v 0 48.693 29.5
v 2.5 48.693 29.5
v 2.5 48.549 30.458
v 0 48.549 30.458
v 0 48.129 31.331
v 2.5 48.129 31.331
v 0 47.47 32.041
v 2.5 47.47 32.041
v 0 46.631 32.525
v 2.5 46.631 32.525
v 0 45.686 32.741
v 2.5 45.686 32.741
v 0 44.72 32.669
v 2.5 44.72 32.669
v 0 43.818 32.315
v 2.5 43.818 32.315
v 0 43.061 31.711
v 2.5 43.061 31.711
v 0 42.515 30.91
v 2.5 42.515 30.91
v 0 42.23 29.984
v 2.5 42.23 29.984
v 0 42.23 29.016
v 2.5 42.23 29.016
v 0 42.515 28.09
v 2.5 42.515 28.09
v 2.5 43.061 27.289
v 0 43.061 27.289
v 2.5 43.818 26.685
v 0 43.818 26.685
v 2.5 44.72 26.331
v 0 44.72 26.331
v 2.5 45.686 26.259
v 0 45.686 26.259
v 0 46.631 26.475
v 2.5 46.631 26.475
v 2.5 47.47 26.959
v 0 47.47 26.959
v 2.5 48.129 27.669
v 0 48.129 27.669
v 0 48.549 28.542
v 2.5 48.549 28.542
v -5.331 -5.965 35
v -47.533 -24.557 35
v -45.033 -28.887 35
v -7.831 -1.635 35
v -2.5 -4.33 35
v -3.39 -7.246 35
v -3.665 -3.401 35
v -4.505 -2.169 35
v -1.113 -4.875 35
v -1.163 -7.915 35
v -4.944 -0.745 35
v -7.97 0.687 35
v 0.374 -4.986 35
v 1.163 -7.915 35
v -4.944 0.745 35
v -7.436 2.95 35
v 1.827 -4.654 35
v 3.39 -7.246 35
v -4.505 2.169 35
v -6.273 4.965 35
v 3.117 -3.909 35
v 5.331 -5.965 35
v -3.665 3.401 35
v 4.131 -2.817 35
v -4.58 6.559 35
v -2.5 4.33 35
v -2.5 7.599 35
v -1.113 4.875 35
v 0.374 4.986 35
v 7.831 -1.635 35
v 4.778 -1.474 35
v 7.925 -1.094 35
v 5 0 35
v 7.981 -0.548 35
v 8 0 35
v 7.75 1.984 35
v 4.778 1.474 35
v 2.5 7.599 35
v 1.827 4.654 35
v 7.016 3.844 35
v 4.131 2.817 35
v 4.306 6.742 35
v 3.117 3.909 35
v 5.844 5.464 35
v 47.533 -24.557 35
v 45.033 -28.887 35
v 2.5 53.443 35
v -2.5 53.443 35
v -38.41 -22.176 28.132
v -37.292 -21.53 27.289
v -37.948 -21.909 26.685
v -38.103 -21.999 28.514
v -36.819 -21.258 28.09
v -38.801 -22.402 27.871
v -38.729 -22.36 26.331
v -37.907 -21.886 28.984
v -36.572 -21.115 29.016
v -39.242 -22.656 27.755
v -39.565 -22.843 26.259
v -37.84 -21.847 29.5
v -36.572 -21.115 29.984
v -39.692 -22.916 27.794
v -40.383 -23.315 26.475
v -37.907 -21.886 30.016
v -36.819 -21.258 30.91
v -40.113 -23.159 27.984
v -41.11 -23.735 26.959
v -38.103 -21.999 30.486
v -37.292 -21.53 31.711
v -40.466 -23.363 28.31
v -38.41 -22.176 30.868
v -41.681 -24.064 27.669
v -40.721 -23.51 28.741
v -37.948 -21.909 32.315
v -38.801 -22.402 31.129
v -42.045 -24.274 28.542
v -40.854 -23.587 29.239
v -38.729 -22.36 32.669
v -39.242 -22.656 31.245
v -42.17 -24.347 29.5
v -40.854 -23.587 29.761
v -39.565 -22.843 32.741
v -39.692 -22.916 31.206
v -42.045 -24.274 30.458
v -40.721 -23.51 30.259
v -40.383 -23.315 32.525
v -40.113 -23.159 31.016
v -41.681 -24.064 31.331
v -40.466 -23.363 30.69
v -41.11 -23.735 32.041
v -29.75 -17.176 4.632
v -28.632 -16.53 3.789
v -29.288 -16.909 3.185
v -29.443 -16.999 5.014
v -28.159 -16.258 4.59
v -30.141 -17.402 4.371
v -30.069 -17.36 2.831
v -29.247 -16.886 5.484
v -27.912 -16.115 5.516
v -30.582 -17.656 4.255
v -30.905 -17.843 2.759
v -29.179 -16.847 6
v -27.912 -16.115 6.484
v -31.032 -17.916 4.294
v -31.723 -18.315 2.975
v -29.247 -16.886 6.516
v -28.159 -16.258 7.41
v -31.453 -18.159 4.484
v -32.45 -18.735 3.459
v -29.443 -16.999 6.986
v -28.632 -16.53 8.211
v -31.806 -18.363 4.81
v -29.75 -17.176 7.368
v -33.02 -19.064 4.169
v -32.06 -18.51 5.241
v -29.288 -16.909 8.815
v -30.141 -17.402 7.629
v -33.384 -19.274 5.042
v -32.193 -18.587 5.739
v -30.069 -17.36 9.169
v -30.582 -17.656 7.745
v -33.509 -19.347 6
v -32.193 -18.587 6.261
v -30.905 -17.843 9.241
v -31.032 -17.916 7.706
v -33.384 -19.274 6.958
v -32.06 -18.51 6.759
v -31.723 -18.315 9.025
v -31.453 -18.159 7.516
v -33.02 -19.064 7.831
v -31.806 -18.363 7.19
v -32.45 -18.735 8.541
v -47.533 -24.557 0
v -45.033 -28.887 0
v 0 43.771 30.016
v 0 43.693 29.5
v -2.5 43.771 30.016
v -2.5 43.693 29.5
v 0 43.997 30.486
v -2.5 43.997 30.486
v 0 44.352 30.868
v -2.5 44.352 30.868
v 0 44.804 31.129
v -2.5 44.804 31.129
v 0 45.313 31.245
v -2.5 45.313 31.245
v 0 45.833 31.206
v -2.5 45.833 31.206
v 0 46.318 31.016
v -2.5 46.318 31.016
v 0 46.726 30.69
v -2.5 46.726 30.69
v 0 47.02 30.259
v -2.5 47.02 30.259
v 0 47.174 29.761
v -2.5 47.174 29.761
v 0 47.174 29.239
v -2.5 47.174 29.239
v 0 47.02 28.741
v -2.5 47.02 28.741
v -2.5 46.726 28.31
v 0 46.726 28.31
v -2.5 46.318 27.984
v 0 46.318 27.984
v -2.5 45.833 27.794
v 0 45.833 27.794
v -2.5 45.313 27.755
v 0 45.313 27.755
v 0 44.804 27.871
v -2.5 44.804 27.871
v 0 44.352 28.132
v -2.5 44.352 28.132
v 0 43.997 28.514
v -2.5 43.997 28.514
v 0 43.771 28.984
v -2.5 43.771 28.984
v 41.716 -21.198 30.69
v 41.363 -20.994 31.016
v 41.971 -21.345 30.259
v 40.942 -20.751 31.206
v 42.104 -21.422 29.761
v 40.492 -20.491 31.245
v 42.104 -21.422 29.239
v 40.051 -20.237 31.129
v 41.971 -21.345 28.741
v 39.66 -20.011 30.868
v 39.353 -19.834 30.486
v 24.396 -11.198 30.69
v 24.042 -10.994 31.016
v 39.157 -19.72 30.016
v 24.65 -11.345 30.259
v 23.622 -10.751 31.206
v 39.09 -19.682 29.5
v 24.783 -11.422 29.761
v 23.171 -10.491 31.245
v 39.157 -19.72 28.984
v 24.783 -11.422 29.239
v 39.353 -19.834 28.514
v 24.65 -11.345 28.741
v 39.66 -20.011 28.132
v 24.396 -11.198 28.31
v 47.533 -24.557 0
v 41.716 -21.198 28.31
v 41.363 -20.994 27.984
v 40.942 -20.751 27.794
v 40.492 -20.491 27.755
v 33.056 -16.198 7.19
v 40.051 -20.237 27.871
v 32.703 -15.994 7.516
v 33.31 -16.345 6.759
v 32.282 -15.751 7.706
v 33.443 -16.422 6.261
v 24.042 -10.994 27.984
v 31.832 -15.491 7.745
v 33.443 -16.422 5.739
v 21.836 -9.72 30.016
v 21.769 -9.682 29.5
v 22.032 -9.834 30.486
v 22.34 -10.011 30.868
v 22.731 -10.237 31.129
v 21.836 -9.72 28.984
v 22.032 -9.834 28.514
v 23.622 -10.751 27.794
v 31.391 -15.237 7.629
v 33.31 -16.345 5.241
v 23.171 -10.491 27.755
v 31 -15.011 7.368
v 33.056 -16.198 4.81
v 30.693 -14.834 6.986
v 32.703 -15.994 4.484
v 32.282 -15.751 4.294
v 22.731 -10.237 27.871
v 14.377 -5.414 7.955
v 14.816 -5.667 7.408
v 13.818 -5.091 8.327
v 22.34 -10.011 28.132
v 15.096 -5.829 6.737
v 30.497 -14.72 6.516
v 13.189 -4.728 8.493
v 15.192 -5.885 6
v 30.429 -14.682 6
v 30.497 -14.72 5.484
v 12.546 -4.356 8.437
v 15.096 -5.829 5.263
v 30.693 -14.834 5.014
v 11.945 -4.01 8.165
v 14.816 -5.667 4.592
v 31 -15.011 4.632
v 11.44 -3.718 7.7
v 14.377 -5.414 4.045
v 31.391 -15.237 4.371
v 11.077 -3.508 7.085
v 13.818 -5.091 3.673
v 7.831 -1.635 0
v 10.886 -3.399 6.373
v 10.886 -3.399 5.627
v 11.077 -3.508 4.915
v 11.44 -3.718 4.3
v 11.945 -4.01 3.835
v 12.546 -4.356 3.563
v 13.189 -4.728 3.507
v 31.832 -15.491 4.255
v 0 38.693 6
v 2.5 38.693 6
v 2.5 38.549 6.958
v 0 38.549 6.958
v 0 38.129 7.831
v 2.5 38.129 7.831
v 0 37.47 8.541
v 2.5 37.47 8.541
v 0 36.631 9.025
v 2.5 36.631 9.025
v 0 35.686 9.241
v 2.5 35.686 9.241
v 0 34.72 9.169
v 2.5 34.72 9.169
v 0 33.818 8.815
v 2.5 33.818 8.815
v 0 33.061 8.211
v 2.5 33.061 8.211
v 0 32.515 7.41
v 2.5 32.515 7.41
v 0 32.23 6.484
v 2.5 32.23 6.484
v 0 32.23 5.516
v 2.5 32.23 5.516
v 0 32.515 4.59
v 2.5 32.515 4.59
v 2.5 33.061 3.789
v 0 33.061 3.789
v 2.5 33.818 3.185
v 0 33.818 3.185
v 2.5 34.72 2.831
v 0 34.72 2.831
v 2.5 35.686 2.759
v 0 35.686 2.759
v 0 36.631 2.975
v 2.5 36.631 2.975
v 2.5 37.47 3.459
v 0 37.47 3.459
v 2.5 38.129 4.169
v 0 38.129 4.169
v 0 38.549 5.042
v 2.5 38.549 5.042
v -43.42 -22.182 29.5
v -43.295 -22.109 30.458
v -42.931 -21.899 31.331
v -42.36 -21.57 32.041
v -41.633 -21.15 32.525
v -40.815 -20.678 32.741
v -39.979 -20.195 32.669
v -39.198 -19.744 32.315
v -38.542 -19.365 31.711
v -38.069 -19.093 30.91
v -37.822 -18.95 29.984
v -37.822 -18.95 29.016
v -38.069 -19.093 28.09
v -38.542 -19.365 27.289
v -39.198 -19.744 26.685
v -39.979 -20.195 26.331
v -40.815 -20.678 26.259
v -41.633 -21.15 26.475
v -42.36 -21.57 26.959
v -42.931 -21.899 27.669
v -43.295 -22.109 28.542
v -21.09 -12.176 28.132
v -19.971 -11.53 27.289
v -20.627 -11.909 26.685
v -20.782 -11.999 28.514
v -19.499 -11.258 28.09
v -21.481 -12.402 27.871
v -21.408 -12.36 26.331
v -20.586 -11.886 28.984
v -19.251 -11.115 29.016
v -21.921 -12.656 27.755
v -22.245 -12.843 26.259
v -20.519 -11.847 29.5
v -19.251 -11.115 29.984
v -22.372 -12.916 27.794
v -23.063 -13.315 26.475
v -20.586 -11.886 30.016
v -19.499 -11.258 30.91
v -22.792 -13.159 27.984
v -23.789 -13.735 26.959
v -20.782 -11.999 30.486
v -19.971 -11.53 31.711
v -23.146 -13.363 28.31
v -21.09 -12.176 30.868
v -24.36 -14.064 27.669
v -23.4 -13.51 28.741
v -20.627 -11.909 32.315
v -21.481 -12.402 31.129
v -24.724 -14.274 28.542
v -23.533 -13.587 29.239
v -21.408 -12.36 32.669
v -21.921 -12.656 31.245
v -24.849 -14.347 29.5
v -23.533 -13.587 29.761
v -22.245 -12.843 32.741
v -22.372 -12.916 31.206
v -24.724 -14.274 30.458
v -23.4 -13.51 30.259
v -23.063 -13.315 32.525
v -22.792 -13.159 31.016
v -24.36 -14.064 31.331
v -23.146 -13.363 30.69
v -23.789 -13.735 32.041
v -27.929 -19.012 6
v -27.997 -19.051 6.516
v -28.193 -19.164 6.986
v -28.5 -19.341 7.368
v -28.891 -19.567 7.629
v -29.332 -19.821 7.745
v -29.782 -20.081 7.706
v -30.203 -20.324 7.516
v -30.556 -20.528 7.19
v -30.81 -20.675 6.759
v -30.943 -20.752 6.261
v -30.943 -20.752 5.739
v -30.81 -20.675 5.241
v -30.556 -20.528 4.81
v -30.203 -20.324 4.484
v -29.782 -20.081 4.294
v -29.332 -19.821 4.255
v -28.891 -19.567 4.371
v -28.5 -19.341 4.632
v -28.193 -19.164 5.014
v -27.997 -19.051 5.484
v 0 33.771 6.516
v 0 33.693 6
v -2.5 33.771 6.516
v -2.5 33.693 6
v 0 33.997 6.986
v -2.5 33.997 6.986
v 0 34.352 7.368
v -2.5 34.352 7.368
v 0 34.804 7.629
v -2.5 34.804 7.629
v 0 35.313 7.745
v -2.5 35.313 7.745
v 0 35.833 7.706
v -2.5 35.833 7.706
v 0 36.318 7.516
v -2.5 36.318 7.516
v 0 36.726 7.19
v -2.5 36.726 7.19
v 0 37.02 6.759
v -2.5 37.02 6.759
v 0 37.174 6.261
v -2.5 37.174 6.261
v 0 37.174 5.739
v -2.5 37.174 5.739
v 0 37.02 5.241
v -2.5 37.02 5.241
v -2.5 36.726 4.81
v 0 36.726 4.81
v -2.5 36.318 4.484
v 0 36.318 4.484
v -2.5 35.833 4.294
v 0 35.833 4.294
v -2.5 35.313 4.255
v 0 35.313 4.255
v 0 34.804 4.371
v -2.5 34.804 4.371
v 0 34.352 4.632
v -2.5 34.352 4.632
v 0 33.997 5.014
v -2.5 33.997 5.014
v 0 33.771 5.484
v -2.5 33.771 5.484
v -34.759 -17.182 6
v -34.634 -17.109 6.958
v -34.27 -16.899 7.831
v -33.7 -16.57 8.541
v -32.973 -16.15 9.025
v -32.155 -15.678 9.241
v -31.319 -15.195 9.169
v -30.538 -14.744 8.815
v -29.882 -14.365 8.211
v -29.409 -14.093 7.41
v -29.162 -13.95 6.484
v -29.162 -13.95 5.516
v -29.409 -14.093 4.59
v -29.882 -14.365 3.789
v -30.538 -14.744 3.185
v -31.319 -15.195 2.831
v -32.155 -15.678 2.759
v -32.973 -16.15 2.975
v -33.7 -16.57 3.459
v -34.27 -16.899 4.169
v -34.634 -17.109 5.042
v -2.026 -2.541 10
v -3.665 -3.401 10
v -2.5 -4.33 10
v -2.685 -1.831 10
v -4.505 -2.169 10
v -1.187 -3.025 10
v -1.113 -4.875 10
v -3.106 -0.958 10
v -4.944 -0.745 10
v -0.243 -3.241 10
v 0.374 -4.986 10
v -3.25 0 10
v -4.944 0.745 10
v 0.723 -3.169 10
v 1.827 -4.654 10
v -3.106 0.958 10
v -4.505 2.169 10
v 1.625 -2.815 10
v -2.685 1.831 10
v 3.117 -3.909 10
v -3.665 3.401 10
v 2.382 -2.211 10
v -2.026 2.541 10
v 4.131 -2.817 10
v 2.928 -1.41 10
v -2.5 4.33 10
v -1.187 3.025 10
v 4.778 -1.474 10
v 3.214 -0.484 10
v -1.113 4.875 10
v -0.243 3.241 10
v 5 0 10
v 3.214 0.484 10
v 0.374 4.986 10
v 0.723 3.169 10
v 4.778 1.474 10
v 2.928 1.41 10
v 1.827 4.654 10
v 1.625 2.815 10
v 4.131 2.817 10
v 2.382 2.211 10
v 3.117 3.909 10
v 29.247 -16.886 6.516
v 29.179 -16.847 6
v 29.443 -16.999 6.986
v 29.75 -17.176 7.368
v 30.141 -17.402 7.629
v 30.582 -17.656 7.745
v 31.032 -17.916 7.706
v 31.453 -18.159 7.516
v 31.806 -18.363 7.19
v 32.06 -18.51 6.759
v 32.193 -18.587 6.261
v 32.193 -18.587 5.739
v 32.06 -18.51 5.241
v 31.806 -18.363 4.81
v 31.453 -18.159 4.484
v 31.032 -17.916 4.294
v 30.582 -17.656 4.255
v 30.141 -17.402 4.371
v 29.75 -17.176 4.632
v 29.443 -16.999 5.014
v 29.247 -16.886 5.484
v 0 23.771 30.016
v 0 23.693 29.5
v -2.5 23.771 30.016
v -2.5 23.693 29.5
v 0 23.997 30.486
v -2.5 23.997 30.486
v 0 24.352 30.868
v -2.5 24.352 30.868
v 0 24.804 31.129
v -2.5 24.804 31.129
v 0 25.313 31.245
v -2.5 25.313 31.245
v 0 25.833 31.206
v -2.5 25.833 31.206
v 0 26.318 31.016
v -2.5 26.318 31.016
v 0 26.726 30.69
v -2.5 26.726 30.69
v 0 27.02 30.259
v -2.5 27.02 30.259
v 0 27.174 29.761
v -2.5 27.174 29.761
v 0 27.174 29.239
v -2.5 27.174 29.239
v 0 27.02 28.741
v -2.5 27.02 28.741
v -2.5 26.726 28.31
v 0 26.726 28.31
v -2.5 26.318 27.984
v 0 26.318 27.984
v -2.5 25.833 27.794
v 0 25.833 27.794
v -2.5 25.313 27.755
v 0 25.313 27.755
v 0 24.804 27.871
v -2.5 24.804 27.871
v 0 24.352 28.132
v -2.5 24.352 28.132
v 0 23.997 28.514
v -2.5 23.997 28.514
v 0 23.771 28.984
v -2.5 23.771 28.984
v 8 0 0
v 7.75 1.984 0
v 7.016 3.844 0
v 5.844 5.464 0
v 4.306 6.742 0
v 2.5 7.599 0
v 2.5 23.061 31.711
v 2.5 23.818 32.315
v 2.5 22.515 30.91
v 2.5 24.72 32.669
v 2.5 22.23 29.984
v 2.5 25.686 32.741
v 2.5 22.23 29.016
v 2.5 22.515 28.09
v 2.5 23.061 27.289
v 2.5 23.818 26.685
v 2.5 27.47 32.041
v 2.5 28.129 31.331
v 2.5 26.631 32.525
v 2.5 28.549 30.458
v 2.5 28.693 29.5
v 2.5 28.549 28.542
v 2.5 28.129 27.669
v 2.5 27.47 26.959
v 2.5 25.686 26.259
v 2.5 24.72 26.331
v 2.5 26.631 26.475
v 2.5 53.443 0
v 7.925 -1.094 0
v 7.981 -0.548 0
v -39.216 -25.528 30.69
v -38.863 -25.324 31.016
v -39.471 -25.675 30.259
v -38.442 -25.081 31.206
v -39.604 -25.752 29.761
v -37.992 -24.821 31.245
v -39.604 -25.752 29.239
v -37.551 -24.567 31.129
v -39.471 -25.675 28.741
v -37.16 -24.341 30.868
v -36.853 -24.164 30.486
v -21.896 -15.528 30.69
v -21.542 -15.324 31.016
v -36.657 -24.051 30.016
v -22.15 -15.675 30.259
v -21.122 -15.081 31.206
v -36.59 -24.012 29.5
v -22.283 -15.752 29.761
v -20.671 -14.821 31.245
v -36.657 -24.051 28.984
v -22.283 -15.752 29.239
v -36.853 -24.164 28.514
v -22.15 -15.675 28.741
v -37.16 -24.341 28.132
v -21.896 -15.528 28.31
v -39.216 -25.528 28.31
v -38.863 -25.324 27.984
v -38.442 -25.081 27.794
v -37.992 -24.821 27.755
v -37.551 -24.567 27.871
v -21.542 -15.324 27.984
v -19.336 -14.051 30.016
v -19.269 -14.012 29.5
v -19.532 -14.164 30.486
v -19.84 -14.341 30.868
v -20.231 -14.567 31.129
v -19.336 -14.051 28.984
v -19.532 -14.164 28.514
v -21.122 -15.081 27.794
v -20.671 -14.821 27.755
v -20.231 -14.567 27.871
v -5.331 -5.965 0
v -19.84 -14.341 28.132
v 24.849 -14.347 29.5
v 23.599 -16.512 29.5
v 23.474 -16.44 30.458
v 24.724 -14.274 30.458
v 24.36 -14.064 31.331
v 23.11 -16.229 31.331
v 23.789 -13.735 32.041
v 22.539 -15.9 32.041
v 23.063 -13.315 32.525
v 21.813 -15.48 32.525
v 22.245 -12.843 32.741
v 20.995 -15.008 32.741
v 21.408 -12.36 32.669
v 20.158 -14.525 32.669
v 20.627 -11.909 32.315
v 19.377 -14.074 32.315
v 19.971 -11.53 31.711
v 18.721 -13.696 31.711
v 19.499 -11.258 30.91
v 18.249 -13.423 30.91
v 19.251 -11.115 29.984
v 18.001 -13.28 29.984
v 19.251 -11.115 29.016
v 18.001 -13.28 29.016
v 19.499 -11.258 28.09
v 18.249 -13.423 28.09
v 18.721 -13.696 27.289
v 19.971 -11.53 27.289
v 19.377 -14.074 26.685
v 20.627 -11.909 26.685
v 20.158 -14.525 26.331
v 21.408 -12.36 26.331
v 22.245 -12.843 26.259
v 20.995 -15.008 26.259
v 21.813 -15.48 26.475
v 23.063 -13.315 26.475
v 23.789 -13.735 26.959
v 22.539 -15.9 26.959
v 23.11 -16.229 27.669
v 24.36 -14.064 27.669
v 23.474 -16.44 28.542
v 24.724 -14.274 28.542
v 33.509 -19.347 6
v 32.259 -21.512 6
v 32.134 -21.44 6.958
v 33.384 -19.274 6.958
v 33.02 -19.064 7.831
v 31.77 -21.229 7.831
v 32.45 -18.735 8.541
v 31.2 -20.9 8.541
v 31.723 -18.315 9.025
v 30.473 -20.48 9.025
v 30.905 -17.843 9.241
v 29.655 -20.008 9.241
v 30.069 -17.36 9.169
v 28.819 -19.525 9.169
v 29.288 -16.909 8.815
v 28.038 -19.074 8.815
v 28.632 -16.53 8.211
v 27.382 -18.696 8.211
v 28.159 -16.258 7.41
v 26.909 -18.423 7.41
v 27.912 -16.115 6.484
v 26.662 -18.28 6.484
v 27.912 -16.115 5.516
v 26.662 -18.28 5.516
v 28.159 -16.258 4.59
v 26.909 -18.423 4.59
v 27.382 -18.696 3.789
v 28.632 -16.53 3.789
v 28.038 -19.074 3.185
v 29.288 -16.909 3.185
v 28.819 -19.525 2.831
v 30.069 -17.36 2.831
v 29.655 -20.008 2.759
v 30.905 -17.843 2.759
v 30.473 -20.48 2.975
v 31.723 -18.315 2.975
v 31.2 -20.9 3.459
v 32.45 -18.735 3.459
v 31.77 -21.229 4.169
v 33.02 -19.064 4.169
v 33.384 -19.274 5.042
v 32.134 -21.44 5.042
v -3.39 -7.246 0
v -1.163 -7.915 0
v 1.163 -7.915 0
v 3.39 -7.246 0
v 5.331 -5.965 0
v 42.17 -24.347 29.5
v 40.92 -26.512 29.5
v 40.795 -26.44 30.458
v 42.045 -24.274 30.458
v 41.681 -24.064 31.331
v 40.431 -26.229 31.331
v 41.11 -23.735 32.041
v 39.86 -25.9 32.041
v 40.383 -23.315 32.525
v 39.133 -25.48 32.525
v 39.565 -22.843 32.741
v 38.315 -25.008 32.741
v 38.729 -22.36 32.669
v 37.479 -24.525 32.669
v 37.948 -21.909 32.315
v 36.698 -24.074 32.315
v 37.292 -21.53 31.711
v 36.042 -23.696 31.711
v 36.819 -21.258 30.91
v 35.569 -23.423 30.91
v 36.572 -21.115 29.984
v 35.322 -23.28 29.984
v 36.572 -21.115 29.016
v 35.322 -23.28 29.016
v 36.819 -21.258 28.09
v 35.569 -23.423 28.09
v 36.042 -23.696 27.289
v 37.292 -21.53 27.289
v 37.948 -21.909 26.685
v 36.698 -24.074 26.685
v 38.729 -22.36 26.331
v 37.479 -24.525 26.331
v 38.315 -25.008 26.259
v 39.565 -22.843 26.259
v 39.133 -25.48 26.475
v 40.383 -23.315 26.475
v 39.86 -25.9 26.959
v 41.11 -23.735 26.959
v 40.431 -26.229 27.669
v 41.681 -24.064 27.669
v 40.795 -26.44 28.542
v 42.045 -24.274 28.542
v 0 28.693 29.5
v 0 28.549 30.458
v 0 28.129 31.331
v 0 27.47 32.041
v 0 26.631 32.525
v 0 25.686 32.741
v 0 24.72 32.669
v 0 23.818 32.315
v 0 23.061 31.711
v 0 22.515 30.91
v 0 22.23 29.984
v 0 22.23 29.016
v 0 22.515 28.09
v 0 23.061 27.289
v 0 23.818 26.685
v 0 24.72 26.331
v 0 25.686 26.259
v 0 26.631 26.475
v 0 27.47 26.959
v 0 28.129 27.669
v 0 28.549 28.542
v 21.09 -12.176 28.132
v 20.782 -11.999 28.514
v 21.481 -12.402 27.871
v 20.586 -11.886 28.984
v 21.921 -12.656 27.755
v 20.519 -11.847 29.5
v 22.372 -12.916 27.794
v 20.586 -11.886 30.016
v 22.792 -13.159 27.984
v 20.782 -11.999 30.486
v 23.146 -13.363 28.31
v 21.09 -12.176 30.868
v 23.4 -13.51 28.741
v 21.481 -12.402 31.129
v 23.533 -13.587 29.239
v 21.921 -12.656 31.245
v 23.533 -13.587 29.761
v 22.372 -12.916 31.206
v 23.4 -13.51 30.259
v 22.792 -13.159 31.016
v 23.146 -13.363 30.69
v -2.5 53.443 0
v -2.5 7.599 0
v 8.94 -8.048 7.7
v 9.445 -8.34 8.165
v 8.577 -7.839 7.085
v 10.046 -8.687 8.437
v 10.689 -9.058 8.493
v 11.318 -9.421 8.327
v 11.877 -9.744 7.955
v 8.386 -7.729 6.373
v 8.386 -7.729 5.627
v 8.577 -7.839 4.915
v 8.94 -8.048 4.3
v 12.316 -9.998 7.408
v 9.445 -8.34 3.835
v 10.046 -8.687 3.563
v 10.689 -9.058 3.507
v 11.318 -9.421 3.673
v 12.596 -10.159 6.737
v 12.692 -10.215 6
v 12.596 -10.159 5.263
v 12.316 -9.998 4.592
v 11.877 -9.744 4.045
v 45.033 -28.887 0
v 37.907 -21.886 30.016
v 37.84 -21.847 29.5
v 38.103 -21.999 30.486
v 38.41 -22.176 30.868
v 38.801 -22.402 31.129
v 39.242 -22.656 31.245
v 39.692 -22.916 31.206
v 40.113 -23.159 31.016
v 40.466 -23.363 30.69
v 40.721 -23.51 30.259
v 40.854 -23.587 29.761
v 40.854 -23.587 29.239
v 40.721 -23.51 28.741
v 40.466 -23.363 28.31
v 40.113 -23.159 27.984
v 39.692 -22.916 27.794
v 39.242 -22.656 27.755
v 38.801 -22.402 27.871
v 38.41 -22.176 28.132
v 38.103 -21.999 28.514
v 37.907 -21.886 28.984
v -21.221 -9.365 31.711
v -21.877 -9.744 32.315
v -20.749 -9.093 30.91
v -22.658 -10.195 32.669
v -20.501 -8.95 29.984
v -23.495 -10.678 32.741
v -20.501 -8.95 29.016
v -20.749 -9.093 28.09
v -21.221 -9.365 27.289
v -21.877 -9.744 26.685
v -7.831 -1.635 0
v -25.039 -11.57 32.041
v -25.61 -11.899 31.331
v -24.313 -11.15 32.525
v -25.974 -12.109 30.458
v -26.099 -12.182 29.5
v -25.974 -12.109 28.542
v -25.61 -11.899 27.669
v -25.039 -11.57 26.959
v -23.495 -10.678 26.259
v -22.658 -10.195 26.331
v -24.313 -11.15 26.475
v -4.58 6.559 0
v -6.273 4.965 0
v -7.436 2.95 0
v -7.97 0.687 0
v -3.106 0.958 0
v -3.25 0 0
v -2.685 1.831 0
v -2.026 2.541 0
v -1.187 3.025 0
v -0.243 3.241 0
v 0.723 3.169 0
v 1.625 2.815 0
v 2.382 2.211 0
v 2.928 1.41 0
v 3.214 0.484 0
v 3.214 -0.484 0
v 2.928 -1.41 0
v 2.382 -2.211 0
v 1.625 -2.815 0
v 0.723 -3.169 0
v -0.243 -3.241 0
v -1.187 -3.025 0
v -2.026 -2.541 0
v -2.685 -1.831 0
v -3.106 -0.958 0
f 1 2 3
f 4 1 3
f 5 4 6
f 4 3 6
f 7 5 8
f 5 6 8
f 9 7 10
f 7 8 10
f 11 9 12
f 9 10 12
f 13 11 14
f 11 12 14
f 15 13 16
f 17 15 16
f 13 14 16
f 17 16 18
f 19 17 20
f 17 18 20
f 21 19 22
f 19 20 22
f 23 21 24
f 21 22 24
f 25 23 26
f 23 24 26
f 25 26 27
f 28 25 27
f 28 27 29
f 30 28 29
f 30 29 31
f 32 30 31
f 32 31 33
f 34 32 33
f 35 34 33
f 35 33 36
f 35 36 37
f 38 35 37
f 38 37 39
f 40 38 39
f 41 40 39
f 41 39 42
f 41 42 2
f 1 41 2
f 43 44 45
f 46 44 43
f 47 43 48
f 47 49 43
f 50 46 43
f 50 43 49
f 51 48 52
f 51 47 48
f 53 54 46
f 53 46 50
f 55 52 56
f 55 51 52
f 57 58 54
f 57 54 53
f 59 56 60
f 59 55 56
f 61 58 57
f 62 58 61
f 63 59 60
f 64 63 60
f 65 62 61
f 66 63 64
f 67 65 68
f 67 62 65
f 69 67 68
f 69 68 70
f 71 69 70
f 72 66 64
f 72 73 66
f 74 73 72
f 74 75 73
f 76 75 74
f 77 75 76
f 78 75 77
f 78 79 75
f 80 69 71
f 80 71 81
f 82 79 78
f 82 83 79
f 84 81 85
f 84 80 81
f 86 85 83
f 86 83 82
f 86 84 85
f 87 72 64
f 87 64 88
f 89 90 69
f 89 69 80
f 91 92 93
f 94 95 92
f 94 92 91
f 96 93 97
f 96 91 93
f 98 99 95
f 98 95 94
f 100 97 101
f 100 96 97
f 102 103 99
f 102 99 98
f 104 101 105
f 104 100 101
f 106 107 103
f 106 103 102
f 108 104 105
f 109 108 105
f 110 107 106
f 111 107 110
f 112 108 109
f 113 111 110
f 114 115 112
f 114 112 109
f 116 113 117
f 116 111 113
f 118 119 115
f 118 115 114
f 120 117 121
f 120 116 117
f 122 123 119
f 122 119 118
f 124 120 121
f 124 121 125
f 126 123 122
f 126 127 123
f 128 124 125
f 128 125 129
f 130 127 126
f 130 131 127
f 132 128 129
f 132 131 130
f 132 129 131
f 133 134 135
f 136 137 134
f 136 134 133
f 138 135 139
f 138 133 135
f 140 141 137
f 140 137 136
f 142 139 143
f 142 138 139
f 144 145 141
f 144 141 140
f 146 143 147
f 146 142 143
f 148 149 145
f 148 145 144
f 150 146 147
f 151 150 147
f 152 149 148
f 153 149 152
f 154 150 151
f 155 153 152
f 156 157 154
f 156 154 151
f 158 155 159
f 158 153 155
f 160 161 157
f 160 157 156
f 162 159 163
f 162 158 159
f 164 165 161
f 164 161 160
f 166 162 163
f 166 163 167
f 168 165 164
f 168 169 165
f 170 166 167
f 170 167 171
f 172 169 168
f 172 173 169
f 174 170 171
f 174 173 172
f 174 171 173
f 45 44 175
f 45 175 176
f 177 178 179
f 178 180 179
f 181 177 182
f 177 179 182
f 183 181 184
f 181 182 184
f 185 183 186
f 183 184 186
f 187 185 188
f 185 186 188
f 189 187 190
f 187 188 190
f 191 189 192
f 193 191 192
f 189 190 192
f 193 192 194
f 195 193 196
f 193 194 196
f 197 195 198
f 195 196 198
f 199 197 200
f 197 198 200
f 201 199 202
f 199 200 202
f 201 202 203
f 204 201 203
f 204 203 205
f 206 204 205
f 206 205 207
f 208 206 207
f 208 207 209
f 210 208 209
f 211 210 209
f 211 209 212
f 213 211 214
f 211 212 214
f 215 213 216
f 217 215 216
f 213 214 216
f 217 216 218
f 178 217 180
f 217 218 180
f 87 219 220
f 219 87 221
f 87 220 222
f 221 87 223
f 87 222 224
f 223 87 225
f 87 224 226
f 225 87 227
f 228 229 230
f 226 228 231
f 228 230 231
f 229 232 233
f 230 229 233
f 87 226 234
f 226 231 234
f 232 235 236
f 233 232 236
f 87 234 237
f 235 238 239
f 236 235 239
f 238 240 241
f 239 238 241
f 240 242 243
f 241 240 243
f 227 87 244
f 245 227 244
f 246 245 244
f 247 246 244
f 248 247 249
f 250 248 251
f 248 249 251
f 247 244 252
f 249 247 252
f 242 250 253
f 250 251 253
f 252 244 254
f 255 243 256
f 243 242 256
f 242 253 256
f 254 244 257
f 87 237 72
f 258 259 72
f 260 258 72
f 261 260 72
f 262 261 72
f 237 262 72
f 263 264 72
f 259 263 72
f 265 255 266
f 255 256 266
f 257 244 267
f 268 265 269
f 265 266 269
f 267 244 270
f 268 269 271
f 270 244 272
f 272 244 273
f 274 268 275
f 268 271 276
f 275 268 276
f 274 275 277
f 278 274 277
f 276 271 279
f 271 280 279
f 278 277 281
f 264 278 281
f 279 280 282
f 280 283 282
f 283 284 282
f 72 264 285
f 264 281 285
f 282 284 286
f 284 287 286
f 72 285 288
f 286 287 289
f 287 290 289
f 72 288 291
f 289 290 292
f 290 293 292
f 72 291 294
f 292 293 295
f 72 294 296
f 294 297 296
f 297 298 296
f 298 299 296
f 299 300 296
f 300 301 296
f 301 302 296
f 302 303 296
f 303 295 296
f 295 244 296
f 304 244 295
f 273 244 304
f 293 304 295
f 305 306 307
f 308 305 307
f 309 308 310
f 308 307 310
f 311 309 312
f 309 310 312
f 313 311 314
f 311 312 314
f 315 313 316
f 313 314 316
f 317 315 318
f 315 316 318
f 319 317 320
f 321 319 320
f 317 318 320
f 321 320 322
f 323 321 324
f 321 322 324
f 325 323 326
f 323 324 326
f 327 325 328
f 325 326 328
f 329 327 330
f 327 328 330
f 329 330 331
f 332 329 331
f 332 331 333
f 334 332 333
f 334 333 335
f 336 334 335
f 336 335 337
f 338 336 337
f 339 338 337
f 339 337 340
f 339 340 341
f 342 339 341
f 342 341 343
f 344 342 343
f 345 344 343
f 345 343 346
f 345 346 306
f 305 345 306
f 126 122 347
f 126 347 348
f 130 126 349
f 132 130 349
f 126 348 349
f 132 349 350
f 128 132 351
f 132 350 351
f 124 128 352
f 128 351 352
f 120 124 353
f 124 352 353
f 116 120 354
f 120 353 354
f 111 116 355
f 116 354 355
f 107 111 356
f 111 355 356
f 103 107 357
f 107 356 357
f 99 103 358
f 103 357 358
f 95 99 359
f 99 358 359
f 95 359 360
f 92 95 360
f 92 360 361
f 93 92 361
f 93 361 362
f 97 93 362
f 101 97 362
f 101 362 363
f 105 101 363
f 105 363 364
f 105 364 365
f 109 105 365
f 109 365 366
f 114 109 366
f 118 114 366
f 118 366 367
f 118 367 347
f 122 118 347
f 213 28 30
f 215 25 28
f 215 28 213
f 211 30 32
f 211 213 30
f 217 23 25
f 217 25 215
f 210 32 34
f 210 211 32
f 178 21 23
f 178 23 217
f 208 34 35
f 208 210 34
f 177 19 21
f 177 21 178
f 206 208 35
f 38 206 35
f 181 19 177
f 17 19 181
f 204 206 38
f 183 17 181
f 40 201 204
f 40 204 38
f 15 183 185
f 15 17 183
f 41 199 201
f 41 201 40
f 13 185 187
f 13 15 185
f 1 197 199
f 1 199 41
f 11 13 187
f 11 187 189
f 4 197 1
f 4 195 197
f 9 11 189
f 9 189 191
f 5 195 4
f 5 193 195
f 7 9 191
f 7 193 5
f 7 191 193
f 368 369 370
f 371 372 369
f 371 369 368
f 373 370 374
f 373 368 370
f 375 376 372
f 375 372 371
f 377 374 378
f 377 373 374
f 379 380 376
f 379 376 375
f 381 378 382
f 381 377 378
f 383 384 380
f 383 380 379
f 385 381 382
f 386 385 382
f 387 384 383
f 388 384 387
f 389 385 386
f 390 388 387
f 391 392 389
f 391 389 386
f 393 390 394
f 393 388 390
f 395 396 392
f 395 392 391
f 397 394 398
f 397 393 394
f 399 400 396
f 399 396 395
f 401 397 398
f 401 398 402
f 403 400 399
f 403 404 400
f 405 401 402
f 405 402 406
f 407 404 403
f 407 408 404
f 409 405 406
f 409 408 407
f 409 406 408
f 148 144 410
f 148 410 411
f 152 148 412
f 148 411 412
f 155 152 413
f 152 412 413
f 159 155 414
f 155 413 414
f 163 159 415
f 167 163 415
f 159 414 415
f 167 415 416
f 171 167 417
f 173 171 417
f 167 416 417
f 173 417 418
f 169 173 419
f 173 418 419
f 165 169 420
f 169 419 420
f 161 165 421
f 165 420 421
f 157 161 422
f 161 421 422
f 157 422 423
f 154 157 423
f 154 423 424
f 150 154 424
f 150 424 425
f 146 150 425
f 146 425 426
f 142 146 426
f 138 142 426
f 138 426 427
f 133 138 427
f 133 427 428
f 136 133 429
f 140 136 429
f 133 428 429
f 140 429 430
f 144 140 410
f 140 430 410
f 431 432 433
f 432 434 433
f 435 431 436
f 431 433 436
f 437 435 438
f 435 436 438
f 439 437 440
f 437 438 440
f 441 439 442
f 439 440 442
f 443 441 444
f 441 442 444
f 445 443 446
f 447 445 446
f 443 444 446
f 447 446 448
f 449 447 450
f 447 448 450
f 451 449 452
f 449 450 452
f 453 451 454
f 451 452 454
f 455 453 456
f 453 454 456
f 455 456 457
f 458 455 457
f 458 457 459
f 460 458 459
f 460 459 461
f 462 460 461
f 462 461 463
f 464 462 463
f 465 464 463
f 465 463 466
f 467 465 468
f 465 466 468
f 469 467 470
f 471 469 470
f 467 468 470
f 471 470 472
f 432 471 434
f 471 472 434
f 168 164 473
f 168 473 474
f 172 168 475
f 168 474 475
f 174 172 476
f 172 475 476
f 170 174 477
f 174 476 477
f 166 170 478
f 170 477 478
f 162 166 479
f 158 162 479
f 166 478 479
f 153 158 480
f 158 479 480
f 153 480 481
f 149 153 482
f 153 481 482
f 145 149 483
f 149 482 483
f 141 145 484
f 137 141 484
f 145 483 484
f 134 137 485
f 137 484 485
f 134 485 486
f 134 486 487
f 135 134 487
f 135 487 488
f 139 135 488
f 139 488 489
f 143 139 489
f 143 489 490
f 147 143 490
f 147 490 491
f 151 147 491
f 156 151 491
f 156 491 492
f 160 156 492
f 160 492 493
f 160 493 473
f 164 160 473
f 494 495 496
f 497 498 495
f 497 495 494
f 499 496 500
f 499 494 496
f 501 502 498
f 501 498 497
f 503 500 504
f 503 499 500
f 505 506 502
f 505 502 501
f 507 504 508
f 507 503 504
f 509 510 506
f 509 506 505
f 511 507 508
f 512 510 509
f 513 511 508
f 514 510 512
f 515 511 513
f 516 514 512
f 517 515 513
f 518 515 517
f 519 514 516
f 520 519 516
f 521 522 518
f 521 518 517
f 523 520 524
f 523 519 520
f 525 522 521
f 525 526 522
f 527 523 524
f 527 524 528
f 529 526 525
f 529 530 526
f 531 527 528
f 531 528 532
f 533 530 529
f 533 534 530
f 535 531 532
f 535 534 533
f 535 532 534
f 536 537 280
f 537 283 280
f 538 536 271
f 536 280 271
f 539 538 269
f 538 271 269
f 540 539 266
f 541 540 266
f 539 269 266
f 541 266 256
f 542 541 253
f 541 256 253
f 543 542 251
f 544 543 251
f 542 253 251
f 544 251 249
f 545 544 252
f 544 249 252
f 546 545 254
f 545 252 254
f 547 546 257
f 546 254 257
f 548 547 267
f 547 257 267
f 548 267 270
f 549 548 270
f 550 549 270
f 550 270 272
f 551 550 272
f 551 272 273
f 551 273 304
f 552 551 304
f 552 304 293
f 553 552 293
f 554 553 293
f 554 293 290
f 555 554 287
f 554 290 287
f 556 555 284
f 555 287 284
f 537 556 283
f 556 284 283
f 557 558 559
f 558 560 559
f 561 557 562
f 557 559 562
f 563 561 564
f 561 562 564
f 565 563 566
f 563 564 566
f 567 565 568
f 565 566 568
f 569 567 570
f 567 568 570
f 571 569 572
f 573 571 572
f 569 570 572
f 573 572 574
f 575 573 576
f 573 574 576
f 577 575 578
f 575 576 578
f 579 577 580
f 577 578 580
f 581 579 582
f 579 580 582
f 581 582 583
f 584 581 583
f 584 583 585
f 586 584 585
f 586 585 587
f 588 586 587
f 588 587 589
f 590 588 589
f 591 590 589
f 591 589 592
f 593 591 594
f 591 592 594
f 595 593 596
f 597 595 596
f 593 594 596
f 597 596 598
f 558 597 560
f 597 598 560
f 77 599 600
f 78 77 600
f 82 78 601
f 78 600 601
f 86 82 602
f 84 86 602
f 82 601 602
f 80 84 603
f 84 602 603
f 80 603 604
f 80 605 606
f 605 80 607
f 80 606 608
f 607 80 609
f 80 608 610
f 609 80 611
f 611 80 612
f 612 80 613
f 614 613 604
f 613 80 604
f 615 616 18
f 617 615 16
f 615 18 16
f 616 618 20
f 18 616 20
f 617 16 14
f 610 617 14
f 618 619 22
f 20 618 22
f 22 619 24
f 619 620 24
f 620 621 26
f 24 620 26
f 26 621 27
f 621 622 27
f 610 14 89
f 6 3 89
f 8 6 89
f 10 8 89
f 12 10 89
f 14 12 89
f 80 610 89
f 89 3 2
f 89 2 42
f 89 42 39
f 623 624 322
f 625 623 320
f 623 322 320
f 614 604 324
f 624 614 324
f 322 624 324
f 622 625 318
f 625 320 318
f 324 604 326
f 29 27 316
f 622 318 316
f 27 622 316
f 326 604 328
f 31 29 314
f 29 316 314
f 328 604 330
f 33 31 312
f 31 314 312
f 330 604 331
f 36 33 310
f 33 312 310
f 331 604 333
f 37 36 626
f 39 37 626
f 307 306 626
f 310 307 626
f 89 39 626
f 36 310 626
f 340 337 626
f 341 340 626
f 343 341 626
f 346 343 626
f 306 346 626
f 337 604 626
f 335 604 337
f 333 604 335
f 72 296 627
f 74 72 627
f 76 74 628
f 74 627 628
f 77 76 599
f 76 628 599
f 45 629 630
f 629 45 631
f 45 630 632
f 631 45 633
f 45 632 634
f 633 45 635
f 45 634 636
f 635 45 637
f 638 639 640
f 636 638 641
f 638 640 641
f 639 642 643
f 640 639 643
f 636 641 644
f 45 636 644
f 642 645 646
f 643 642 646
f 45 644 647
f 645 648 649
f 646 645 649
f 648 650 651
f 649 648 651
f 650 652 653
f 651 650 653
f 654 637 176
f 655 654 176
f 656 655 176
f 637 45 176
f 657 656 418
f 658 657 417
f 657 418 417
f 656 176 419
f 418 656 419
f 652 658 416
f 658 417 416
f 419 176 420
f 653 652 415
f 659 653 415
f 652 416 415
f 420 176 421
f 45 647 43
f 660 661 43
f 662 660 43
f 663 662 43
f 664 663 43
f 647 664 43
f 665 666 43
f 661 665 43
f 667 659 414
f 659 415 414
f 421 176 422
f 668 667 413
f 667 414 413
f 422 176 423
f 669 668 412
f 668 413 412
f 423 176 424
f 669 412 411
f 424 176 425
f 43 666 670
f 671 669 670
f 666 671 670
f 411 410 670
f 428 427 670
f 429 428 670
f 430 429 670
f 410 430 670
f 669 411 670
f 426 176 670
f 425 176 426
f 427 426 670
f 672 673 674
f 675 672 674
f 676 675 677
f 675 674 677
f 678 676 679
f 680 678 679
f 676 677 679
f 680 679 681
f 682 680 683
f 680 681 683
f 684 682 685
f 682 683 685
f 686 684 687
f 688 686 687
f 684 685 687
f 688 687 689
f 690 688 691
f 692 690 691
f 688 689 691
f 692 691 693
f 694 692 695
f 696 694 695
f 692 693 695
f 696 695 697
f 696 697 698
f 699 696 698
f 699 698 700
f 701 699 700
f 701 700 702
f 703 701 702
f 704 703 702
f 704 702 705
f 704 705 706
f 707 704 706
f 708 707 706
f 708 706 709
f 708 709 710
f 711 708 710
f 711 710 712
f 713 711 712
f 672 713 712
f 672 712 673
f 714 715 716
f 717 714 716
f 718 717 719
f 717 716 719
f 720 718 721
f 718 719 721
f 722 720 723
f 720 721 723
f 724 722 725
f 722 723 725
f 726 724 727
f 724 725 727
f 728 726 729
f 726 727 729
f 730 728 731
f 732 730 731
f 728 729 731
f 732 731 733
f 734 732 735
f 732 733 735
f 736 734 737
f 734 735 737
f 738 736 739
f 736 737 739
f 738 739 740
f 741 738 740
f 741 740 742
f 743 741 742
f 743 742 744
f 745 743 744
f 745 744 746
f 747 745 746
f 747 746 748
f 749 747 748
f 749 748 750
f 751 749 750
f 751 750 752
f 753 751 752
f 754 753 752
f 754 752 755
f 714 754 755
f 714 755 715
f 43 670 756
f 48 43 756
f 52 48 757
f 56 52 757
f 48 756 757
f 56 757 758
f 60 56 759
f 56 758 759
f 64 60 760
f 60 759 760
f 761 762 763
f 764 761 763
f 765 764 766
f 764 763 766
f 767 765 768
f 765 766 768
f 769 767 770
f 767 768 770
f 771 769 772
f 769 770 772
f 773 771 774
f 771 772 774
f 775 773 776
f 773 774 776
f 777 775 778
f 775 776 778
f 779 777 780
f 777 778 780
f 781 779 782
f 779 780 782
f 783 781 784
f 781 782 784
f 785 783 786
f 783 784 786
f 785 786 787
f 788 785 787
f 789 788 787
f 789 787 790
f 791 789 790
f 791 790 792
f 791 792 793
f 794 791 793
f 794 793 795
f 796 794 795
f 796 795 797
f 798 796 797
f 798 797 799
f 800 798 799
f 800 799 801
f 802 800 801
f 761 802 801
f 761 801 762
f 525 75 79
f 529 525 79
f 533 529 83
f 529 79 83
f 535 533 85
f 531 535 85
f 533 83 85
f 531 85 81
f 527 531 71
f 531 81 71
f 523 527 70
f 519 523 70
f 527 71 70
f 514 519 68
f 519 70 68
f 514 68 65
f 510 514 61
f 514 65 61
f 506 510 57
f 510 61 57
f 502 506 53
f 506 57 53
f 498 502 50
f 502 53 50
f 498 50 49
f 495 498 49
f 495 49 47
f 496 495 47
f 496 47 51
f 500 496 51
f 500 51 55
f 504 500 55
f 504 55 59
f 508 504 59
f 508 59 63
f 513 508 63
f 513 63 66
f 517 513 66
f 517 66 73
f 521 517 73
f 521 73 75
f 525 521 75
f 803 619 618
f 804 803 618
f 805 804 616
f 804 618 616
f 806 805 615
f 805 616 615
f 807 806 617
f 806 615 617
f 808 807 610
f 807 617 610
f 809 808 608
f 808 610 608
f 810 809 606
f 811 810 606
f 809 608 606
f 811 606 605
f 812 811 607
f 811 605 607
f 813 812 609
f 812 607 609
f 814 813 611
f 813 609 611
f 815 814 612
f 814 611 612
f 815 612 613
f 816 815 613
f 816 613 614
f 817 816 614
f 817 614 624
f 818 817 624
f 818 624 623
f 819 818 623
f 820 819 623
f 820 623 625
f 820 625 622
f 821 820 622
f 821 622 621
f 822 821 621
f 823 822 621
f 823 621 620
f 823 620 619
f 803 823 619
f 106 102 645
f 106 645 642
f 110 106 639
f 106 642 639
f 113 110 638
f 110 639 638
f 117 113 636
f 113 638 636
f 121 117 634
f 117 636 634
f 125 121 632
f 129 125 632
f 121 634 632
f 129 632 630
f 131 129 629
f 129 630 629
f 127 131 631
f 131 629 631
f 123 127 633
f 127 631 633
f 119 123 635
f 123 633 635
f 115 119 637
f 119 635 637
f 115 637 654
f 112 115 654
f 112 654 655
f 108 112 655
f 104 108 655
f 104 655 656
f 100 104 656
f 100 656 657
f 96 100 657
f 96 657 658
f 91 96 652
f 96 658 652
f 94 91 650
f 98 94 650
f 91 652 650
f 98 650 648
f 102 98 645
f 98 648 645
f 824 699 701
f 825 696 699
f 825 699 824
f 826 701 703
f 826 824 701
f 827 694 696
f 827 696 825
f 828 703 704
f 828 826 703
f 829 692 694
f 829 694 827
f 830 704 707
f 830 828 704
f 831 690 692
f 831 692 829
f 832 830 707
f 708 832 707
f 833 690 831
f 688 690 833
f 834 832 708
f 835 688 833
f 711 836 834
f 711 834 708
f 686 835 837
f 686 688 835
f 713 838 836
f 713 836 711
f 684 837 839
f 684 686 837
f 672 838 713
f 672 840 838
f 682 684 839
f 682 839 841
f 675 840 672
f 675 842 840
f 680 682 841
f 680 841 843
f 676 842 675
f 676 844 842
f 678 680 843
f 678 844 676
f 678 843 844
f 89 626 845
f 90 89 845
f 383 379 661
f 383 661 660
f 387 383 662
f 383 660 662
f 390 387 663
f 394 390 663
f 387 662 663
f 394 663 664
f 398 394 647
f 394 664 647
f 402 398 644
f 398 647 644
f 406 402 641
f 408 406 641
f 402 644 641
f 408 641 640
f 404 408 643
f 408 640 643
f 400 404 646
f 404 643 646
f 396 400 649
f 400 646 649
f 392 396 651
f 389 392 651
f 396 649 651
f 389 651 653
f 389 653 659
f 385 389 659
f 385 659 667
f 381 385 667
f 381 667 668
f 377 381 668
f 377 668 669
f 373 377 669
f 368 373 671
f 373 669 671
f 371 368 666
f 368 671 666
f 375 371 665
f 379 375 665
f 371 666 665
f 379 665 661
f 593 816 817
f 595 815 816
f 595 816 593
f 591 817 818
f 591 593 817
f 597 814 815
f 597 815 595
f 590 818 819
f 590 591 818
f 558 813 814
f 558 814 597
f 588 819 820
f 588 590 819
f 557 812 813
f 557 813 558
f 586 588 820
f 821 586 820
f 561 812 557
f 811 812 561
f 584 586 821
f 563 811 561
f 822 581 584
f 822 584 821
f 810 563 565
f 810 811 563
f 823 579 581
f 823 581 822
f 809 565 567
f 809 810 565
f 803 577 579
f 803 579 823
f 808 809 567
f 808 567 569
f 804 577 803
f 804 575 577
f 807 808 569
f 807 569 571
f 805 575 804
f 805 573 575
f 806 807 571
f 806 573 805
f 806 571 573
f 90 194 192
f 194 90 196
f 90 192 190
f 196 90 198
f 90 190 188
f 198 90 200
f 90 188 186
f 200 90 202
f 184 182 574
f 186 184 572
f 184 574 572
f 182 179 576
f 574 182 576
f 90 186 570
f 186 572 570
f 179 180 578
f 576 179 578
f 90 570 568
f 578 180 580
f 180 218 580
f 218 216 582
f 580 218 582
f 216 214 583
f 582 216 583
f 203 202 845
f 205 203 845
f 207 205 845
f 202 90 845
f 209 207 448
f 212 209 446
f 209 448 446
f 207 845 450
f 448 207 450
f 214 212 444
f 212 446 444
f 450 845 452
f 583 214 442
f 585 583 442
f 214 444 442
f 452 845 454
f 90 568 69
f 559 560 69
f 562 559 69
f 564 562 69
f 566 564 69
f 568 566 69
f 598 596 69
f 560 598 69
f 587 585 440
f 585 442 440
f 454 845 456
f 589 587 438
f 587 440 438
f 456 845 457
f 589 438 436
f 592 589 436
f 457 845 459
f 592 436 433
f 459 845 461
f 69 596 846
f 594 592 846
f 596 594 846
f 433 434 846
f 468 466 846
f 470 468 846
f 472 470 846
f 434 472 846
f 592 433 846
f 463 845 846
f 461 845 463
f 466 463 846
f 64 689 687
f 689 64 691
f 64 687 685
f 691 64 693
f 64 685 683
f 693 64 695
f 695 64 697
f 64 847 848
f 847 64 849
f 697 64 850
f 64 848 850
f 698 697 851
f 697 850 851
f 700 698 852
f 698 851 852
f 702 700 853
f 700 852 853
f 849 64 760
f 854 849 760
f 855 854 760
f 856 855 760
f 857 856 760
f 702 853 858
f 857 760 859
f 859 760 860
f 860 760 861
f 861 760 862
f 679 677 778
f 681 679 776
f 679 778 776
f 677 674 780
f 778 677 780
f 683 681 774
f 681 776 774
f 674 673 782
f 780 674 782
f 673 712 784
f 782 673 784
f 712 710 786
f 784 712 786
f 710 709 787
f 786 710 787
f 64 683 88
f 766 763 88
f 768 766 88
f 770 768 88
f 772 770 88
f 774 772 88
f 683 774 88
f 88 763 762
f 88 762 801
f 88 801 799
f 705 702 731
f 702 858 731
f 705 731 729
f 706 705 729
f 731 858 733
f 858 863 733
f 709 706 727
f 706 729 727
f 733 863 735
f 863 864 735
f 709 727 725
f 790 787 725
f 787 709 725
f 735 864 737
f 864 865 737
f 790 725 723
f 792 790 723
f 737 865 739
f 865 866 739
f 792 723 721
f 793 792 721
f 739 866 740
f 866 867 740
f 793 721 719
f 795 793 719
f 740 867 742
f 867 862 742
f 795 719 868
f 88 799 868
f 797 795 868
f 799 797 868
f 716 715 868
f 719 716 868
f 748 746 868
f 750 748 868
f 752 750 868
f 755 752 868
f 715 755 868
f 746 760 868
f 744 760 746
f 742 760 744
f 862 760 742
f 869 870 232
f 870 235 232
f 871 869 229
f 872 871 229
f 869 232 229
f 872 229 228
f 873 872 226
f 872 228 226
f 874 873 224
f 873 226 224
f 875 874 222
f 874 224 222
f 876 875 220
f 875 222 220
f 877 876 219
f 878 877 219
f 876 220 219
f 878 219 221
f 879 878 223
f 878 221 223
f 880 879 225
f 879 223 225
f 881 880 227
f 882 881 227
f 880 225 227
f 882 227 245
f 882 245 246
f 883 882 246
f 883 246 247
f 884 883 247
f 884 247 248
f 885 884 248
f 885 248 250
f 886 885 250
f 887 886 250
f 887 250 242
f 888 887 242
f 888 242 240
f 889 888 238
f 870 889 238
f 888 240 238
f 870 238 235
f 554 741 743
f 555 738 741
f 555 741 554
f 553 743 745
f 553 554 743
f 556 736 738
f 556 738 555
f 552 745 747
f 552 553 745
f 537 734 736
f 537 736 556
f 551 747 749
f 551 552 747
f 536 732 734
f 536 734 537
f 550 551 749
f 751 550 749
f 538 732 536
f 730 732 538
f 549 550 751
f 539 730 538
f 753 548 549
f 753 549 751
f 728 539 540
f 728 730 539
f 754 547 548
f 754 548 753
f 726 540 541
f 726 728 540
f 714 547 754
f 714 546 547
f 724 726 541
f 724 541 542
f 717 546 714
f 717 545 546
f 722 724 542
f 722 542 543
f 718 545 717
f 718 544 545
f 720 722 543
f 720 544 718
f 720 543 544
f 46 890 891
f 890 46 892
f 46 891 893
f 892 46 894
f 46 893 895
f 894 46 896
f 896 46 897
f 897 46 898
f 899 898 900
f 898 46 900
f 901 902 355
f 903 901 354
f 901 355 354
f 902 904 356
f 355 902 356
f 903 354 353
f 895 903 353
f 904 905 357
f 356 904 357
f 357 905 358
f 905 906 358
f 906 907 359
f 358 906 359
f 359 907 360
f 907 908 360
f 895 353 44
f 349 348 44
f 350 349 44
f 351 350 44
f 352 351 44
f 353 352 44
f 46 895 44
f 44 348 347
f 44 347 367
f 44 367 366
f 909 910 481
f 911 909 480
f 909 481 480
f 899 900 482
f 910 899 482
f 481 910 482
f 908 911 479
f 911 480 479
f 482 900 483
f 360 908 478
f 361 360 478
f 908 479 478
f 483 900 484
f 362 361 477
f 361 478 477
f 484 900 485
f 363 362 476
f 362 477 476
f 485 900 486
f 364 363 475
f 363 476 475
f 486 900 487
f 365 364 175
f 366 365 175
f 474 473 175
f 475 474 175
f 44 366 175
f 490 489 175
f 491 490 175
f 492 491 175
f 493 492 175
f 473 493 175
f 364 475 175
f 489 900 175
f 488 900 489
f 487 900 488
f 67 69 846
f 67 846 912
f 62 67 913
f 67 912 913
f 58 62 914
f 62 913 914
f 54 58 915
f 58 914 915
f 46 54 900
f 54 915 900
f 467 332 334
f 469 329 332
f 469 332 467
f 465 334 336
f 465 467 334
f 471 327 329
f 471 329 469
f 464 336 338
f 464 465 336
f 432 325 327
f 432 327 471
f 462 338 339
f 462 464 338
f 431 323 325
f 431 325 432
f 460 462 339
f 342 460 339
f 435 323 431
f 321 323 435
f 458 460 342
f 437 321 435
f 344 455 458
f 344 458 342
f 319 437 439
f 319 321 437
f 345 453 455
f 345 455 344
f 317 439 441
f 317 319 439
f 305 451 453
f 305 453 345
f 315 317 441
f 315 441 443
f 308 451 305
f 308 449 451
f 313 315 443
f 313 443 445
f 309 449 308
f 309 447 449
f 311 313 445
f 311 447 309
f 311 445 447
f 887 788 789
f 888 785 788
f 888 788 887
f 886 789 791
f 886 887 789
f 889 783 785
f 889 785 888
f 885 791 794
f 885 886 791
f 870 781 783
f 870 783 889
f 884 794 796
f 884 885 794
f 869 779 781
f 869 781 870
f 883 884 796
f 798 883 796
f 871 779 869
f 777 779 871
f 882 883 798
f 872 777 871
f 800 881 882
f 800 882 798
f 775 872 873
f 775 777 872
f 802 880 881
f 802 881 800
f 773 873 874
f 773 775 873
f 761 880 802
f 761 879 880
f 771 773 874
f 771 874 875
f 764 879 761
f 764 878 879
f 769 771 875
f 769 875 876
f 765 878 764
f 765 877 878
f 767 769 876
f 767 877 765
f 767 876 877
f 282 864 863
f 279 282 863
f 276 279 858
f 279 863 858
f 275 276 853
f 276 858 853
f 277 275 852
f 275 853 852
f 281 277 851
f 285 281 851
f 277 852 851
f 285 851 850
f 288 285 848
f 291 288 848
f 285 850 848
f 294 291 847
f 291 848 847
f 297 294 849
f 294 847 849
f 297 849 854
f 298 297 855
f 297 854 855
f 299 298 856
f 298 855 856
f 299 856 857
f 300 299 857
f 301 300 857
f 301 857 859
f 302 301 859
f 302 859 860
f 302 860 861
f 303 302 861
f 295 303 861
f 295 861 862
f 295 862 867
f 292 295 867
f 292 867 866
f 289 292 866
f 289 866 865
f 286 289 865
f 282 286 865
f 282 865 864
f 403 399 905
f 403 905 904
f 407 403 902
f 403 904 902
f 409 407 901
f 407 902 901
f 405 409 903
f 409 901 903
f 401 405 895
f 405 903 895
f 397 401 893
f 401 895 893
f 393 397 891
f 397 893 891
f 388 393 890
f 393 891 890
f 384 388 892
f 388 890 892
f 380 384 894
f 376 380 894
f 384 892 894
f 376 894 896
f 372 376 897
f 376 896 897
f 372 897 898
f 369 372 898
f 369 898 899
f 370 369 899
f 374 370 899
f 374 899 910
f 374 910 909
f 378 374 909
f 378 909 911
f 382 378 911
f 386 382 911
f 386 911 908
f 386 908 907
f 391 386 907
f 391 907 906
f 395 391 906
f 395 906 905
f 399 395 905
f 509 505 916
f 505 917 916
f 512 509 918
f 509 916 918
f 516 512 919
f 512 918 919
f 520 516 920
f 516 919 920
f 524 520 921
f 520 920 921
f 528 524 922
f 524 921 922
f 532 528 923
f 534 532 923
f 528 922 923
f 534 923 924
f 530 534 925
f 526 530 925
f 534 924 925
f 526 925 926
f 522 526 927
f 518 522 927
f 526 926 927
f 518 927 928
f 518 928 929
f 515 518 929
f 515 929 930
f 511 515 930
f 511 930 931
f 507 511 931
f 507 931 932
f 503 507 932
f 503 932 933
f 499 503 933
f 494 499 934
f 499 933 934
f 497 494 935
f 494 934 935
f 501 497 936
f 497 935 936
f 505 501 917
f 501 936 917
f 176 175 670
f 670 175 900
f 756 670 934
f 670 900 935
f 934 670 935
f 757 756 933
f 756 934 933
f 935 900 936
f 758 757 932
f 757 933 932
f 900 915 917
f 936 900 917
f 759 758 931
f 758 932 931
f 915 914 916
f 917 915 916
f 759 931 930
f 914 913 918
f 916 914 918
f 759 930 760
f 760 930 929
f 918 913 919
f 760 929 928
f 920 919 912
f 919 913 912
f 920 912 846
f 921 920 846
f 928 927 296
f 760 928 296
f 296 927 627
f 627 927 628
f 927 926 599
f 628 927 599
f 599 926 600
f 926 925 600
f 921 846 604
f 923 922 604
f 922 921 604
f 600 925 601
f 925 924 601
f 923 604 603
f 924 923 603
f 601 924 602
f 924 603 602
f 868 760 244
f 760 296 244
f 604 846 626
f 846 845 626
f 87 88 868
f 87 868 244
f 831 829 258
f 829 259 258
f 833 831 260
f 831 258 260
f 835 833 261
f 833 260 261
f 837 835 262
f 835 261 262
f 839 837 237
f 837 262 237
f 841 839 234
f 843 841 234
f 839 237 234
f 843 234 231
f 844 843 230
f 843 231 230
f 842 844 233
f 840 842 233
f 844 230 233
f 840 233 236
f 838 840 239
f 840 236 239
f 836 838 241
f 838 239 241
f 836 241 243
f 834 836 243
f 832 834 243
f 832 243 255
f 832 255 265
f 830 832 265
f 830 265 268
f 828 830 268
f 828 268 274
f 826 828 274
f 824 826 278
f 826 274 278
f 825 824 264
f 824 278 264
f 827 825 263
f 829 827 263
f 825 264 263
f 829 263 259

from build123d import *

# Parameters (mm, degrees)
F1_DEPTH        = 35
F2_DEPTH        = 35
F6_D            = 3.5
F6_DEPTH        = 12
F6_CBORE_D      = 6.5
F6_CBORE_DEPTH  = 2.5
F6_TIP          = 1.0515060833
F7_D            = 3.5
F7_DEPTH        = 12
F7_CBORE_D      = 6.5
F7_CBORE_DEPTH  = 2.5
F7_TIP          = 1.0515060833
F8_D            = 3.5
F8_DEPTH        = 12
F8_CBORE_D      = 6.5
F8_CBORE_DEPTH  = 2.5
F8_TIP          = 1.0515060833
F3_R            = 2.5
F9_DEPTH        = 25
F11_D           = 6.5
F11_DEPTH       = 35
F11_CBORE_D     = 10
F11_CBORE_DEPTH = 25
F11_TIP         = 1.9527970118


with BuildPart() as f1:
    # F0 (on Top) → F1 (new body)
    with BuildSketch(Plane.XY):
        with BuildLine():
            Line((-2.5, 7.5993420768), (-2.5, 1.443375673))
            Line((-2.5, 1.443375673), (2.5, 1.443375673))
            Line((2.5, 1.443375673), (2.5, 7.5993420768))
            ThreePointArc((2.5, 7.5993420768), (0, 8), (-2.5, 7.5993420768))
        make_face()
        with BuildLine():
            Line((-2.5, 53.443375673), (-2.5, 7.5993420768))
            ThreePointArc((-2.5, 7.5993420768), (0, 8), (2.5, 7.5993420768))
            Line((2.5, 7.5993420768), (2.5, 53.443375673))
            Line((2.5, 53.443375673), (-2.5, 53.443375673))
        make_face()
        with BuildLine():
            Line((7.8312232905, -1.6346075289), (2.5, 1.443375673))
            Line((2.5, 1.443375673), (0, -2.8867513459))
            Line((0, -2.8867513459), (5.3312232905, -5.9647345479))
            ThreePointArc((5.3312232905, -5.9647345479), (6.9282032303, -4), (7.8312232905, -1.6346075289))
        make_face()
        Polygon((2.5, 1.443375673), (-2.5, 1.443375673), (0, -2.8867513459), align=None)
        with BuildLine():
            Line((0, -2.8867513459), (-2.5, 1.443375673))
            Line((-2.5, 1.443375673), (-7.8312232905, -1.6346075289))
            ThreePointArc((-7.8312232905, -1.6346075289), (-6.9282032303, -4), (-5.3312232905, -5.9647345479))
            Line((-5.3312232905, -5.9647345479), (0, -2.8867513459))
        make_face()
        with BuildLine():
            Line((47.5333209968, -24.556624327), (7.8312232905, -1.6346075289))
            ThreePointArc((7.8312232905, -1.6346075289), (6.9282032303, -4), (5.3312232905, -5.9647345479))
            Line((5.3312232905, -5.9647345479), (45.0333209968, -28.8867513459))
            Line((45.0333209968, -28.8867513459), (47.5333209968, -24.556624327))
        make_face()
        with BuildLine():
            ThreePointArc((-5.3312232905, -5.9647345479), (-6.9282032303, -4), (-7.8312232905, -1.6346075289))
            Line((-7.8312232905, -1.6346075289), (-47.5333209968, -24.556624327))
            Line((-47.5333209968, -24.556624327), (-45.0333209968, -28.8867513459))
            Line((-45.0333209968, -28.8867513459), (-5.3312232905, -5.9647345479))
        make_face()
    extrude(amount=F1_DEPTH)

    # F0 (on Top) → F2 (join)
    with BuildSketch(Plane.XY):
        with BuildLine():
            Line((-7.8312232905, -1.6346075289), (-2.5, 1.443375673))
            Line((-2.5, 1.443375673), (-2.5, 7.5993420768))
            ThreePointArc((-2.5, 7.5993420768), (-6.9282032303, 4), (-7.8312232905, -1.6346075289))
        make_face()
        with BuildLine():
            Line((2.5, 7.5993420768), (2.5, 1.443375673))
            Line((2.5, 1.443375673), (7.8312232905, -1.6346075289))
            ThreePointArc((7.8312232905, -1.6346075289), (7.9576939601, -0.8216488531), (8, 0))
            ThreePointArc((8, 0), (6.4807406984, 4.6904157598), (2.5, 7.5993420768))
        make_face()
        with BuildLine():
            Line((5.3312232905, -5.9647345479), (0, -2.8867513459))
            Line((0, -2.8867513459), (-5.3312232905, -5.9647345479))
            ThreePointArc((-5.3312232905, -5.9647345479), (0, -8), (5.3312232905, -5.9647345479))
        make_face()
    extrude(amount=F2_DEPTH)

    # F6
    with Locations(Plane(origin=(-1.25, -2.1650635095, 0), x_dir=(0.8660254038, -0.5, 0), z_dir=(-0.5, -0.8660254038, 0))):
        with Locations((25.443375673, 29.5), (45.443375673, 29.5), (35.443375673, 6)):
            CounterBoreHole(F6_D / 2, F6_CBORE_D / 2, F6_CBORE_DEPTH, depth=F6_DEPTH)
            with Locations((0, 0, -(F6_DEPTH + F6_TIP / 2))):  # 118° drill point
                Cone(0, F6_D / 2, F6_TIP, mode=Mode.SUBTRACT)

    # F7
    with Locations(Plane.YZ.offset(2.5)):
        with Locations((25.443375673, 29.5), (45.443375673, 29.5), (35.443375673, 6)):
            CounterBoreHole(F7_D / 2, F7_CBORE_D / 2, F7_CBORE_DEPTH, depth=F7_DEPTH)
            with Locations((0, 0, -(F7_DEPTH + F7_TIP / 2))):  # 118° drill point
                Cone(0, F7_D / 2, F7_TIP, mode=Mode.SUBTRACT)

    # F8
    with Locations(Plane(origin=(-1.25, 2.1650635095, 0), x_dir=(-0.8660254038, -0.5, 0), z_dir=(-0.5, 0.8660254038, 0))):
        with Locations((25.443375673, 29.5), (45.443375673, 29.5), (35.443375673, 6)):
            CounterBoreHole(F8_D / 2, F8_CBORE_D / 2, F8_CBORE_DEPTH, depth=F8_DEPTH)
            with Locations((0, 0, -(F8_DEPTH + F8_TIP / 2))):  # 118° drill point
                Cone(0, F8_D / 2, F8_TIP, mode=Mode.SUBTRACT)

    # F3 (on face) → F9 (cut)
    with BuildSketch(Plane(origin=(-1.25, -2.1650635095, 0), x_dir=(0.8660254038, -0.5, 0), z_dir=(-0.5, -0.8660254038, 0))):
        with Locations((13.5993420768, 6)):
            Circle(F3_R)
    extrude(amount=-F9_DEPTH, mode=Mode.SUBTRACT)

    # F11
    with Locations(Plane.XY.offset(35)):
        with Locations((0, 0)):
            CounterBoreHole(F11_D / 2, F11_CBORE_D / 2, F11_CBORE_DEPTH, depth=F11_DEPTH)
            with Locations((0, 0, -(F11_DEPTH + F11_TIP / 2))):  # 118° drill point
                Cone(0, F11_D / 2, F11_TIP, mode=Mode.SUBTRACT)


solid = f1.part
